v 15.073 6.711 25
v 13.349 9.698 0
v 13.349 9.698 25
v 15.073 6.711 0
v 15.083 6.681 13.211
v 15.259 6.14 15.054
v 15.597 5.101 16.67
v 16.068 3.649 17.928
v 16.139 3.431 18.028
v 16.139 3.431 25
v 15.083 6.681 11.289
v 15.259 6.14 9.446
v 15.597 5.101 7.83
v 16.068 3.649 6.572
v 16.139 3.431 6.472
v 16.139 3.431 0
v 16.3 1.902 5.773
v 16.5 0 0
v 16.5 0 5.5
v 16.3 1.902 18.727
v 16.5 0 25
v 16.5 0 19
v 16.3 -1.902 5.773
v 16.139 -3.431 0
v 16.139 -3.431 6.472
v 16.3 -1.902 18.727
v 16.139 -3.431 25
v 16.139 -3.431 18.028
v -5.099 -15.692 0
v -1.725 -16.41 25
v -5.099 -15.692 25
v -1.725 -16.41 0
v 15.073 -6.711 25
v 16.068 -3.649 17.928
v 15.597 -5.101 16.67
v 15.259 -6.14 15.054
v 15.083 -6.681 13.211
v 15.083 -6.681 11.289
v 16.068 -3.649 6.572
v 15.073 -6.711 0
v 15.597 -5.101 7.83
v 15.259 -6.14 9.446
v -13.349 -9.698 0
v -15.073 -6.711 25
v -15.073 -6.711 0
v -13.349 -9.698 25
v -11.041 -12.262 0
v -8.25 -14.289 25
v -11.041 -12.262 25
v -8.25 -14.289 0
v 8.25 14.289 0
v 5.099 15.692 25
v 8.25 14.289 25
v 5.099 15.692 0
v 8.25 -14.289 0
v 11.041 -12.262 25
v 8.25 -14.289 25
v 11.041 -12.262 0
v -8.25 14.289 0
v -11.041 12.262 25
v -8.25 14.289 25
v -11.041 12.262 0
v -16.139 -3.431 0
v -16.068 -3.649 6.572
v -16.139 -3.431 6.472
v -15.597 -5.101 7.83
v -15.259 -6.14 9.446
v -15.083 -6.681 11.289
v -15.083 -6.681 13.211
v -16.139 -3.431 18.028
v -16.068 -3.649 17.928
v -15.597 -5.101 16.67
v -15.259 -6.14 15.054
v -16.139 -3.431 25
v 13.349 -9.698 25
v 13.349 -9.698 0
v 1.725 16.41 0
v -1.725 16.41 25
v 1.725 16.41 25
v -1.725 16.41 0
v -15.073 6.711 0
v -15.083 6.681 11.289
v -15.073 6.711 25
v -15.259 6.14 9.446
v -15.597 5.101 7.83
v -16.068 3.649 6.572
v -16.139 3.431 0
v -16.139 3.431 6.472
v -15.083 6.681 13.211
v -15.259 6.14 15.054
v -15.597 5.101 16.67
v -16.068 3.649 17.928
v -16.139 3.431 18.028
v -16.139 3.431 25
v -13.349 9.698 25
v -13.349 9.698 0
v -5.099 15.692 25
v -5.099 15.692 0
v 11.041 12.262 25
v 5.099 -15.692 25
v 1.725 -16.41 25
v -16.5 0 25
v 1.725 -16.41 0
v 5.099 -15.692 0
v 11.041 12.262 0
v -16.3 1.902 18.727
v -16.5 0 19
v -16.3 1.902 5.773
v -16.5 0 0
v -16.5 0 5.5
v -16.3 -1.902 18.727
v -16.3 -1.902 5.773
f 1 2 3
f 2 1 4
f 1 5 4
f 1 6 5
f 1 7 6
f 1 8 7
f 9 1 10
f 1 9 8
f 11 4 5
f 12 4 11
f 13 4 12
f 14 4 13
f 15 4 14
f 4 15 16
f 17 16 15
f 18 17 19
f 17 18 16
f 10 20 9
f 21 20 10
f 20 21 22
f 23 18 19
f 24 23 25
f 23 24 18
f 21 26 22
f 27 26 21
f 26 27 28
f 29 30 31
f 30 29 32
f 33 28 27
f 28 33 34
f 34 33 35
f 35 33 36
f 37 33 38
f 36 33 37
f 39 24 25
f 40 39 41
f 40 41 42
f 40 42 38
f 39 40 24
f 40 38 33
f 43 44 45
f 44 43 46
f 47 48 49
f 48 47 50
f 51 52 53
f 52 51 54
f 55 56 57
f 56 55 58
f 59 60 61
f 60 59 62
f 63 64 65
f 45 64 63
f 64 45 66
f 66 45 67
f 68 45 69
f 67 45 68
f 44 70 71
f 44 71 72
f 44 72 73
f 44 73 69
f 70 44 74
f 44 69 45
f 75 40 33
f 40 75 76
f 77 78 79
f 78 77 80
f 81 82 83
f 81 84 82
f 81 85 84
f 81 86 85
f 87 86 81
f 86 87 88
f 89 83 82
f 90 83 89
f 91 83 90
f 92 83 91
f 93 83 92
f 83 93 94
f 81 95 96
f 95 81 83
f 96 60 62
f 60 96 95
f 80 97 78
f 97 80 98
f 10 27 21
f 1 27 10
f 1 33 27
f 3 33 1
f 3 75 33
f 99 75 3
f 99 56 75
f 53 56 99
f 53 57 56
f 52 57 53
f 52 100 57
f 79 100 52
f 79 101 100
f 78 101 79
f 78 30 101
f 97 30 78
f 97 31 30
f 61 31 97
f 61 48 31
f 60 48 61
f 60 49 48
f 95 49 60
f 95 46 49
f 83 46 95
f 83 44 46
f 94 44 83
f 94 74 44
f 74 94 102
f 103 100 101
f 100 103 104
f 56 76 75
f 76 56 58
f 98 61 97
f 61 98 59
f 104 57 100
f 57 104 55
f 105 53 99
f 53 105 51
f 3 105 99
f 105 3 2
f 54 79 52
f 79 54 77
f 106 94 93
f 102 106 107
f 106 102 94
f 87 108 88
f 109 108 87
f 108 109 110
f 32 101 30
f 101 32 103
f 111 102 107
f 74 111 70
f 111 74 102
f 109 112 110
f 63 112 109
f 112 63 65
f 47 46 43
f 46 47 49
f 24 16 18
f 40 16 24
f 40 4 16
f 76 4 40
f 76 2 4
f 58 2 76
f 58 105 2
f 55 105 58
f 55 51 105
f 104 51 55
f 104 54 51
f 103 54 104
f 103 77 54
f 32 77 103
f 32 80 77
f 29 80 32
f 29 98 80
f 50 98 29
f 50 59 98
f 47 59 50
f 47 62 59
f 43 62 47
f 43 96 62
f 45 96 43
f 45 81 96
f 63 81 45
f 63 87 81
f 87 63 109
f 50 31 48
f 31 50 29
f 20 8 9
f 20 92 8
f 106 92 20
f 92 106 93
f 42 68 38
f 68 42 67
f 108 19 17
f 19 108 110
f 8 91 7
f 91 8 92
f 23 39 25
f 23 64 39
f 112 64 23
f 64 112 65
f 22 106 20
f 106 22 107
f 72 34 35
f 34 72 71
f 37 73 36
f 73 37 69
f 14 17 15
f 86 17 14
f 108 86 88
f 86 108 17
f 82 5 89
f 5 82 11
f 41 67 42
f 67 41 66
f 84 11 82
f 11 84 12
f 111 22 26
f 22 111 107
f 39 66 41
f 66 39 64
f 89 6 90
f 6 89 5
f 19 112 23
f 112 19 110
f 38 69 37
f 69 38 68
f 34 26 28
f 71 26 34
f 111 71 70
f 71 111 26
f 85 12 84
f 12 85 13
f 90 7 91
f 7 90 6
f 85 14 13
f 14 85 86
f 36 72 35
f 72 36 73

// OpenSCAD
difference() {
	cylinder(r=33/2,h=25);

	rotate(90,[0,1,0])
	translate([-(24.5)/2,0,-17])
	cylinder(r=13.5/2,h=35);
}
